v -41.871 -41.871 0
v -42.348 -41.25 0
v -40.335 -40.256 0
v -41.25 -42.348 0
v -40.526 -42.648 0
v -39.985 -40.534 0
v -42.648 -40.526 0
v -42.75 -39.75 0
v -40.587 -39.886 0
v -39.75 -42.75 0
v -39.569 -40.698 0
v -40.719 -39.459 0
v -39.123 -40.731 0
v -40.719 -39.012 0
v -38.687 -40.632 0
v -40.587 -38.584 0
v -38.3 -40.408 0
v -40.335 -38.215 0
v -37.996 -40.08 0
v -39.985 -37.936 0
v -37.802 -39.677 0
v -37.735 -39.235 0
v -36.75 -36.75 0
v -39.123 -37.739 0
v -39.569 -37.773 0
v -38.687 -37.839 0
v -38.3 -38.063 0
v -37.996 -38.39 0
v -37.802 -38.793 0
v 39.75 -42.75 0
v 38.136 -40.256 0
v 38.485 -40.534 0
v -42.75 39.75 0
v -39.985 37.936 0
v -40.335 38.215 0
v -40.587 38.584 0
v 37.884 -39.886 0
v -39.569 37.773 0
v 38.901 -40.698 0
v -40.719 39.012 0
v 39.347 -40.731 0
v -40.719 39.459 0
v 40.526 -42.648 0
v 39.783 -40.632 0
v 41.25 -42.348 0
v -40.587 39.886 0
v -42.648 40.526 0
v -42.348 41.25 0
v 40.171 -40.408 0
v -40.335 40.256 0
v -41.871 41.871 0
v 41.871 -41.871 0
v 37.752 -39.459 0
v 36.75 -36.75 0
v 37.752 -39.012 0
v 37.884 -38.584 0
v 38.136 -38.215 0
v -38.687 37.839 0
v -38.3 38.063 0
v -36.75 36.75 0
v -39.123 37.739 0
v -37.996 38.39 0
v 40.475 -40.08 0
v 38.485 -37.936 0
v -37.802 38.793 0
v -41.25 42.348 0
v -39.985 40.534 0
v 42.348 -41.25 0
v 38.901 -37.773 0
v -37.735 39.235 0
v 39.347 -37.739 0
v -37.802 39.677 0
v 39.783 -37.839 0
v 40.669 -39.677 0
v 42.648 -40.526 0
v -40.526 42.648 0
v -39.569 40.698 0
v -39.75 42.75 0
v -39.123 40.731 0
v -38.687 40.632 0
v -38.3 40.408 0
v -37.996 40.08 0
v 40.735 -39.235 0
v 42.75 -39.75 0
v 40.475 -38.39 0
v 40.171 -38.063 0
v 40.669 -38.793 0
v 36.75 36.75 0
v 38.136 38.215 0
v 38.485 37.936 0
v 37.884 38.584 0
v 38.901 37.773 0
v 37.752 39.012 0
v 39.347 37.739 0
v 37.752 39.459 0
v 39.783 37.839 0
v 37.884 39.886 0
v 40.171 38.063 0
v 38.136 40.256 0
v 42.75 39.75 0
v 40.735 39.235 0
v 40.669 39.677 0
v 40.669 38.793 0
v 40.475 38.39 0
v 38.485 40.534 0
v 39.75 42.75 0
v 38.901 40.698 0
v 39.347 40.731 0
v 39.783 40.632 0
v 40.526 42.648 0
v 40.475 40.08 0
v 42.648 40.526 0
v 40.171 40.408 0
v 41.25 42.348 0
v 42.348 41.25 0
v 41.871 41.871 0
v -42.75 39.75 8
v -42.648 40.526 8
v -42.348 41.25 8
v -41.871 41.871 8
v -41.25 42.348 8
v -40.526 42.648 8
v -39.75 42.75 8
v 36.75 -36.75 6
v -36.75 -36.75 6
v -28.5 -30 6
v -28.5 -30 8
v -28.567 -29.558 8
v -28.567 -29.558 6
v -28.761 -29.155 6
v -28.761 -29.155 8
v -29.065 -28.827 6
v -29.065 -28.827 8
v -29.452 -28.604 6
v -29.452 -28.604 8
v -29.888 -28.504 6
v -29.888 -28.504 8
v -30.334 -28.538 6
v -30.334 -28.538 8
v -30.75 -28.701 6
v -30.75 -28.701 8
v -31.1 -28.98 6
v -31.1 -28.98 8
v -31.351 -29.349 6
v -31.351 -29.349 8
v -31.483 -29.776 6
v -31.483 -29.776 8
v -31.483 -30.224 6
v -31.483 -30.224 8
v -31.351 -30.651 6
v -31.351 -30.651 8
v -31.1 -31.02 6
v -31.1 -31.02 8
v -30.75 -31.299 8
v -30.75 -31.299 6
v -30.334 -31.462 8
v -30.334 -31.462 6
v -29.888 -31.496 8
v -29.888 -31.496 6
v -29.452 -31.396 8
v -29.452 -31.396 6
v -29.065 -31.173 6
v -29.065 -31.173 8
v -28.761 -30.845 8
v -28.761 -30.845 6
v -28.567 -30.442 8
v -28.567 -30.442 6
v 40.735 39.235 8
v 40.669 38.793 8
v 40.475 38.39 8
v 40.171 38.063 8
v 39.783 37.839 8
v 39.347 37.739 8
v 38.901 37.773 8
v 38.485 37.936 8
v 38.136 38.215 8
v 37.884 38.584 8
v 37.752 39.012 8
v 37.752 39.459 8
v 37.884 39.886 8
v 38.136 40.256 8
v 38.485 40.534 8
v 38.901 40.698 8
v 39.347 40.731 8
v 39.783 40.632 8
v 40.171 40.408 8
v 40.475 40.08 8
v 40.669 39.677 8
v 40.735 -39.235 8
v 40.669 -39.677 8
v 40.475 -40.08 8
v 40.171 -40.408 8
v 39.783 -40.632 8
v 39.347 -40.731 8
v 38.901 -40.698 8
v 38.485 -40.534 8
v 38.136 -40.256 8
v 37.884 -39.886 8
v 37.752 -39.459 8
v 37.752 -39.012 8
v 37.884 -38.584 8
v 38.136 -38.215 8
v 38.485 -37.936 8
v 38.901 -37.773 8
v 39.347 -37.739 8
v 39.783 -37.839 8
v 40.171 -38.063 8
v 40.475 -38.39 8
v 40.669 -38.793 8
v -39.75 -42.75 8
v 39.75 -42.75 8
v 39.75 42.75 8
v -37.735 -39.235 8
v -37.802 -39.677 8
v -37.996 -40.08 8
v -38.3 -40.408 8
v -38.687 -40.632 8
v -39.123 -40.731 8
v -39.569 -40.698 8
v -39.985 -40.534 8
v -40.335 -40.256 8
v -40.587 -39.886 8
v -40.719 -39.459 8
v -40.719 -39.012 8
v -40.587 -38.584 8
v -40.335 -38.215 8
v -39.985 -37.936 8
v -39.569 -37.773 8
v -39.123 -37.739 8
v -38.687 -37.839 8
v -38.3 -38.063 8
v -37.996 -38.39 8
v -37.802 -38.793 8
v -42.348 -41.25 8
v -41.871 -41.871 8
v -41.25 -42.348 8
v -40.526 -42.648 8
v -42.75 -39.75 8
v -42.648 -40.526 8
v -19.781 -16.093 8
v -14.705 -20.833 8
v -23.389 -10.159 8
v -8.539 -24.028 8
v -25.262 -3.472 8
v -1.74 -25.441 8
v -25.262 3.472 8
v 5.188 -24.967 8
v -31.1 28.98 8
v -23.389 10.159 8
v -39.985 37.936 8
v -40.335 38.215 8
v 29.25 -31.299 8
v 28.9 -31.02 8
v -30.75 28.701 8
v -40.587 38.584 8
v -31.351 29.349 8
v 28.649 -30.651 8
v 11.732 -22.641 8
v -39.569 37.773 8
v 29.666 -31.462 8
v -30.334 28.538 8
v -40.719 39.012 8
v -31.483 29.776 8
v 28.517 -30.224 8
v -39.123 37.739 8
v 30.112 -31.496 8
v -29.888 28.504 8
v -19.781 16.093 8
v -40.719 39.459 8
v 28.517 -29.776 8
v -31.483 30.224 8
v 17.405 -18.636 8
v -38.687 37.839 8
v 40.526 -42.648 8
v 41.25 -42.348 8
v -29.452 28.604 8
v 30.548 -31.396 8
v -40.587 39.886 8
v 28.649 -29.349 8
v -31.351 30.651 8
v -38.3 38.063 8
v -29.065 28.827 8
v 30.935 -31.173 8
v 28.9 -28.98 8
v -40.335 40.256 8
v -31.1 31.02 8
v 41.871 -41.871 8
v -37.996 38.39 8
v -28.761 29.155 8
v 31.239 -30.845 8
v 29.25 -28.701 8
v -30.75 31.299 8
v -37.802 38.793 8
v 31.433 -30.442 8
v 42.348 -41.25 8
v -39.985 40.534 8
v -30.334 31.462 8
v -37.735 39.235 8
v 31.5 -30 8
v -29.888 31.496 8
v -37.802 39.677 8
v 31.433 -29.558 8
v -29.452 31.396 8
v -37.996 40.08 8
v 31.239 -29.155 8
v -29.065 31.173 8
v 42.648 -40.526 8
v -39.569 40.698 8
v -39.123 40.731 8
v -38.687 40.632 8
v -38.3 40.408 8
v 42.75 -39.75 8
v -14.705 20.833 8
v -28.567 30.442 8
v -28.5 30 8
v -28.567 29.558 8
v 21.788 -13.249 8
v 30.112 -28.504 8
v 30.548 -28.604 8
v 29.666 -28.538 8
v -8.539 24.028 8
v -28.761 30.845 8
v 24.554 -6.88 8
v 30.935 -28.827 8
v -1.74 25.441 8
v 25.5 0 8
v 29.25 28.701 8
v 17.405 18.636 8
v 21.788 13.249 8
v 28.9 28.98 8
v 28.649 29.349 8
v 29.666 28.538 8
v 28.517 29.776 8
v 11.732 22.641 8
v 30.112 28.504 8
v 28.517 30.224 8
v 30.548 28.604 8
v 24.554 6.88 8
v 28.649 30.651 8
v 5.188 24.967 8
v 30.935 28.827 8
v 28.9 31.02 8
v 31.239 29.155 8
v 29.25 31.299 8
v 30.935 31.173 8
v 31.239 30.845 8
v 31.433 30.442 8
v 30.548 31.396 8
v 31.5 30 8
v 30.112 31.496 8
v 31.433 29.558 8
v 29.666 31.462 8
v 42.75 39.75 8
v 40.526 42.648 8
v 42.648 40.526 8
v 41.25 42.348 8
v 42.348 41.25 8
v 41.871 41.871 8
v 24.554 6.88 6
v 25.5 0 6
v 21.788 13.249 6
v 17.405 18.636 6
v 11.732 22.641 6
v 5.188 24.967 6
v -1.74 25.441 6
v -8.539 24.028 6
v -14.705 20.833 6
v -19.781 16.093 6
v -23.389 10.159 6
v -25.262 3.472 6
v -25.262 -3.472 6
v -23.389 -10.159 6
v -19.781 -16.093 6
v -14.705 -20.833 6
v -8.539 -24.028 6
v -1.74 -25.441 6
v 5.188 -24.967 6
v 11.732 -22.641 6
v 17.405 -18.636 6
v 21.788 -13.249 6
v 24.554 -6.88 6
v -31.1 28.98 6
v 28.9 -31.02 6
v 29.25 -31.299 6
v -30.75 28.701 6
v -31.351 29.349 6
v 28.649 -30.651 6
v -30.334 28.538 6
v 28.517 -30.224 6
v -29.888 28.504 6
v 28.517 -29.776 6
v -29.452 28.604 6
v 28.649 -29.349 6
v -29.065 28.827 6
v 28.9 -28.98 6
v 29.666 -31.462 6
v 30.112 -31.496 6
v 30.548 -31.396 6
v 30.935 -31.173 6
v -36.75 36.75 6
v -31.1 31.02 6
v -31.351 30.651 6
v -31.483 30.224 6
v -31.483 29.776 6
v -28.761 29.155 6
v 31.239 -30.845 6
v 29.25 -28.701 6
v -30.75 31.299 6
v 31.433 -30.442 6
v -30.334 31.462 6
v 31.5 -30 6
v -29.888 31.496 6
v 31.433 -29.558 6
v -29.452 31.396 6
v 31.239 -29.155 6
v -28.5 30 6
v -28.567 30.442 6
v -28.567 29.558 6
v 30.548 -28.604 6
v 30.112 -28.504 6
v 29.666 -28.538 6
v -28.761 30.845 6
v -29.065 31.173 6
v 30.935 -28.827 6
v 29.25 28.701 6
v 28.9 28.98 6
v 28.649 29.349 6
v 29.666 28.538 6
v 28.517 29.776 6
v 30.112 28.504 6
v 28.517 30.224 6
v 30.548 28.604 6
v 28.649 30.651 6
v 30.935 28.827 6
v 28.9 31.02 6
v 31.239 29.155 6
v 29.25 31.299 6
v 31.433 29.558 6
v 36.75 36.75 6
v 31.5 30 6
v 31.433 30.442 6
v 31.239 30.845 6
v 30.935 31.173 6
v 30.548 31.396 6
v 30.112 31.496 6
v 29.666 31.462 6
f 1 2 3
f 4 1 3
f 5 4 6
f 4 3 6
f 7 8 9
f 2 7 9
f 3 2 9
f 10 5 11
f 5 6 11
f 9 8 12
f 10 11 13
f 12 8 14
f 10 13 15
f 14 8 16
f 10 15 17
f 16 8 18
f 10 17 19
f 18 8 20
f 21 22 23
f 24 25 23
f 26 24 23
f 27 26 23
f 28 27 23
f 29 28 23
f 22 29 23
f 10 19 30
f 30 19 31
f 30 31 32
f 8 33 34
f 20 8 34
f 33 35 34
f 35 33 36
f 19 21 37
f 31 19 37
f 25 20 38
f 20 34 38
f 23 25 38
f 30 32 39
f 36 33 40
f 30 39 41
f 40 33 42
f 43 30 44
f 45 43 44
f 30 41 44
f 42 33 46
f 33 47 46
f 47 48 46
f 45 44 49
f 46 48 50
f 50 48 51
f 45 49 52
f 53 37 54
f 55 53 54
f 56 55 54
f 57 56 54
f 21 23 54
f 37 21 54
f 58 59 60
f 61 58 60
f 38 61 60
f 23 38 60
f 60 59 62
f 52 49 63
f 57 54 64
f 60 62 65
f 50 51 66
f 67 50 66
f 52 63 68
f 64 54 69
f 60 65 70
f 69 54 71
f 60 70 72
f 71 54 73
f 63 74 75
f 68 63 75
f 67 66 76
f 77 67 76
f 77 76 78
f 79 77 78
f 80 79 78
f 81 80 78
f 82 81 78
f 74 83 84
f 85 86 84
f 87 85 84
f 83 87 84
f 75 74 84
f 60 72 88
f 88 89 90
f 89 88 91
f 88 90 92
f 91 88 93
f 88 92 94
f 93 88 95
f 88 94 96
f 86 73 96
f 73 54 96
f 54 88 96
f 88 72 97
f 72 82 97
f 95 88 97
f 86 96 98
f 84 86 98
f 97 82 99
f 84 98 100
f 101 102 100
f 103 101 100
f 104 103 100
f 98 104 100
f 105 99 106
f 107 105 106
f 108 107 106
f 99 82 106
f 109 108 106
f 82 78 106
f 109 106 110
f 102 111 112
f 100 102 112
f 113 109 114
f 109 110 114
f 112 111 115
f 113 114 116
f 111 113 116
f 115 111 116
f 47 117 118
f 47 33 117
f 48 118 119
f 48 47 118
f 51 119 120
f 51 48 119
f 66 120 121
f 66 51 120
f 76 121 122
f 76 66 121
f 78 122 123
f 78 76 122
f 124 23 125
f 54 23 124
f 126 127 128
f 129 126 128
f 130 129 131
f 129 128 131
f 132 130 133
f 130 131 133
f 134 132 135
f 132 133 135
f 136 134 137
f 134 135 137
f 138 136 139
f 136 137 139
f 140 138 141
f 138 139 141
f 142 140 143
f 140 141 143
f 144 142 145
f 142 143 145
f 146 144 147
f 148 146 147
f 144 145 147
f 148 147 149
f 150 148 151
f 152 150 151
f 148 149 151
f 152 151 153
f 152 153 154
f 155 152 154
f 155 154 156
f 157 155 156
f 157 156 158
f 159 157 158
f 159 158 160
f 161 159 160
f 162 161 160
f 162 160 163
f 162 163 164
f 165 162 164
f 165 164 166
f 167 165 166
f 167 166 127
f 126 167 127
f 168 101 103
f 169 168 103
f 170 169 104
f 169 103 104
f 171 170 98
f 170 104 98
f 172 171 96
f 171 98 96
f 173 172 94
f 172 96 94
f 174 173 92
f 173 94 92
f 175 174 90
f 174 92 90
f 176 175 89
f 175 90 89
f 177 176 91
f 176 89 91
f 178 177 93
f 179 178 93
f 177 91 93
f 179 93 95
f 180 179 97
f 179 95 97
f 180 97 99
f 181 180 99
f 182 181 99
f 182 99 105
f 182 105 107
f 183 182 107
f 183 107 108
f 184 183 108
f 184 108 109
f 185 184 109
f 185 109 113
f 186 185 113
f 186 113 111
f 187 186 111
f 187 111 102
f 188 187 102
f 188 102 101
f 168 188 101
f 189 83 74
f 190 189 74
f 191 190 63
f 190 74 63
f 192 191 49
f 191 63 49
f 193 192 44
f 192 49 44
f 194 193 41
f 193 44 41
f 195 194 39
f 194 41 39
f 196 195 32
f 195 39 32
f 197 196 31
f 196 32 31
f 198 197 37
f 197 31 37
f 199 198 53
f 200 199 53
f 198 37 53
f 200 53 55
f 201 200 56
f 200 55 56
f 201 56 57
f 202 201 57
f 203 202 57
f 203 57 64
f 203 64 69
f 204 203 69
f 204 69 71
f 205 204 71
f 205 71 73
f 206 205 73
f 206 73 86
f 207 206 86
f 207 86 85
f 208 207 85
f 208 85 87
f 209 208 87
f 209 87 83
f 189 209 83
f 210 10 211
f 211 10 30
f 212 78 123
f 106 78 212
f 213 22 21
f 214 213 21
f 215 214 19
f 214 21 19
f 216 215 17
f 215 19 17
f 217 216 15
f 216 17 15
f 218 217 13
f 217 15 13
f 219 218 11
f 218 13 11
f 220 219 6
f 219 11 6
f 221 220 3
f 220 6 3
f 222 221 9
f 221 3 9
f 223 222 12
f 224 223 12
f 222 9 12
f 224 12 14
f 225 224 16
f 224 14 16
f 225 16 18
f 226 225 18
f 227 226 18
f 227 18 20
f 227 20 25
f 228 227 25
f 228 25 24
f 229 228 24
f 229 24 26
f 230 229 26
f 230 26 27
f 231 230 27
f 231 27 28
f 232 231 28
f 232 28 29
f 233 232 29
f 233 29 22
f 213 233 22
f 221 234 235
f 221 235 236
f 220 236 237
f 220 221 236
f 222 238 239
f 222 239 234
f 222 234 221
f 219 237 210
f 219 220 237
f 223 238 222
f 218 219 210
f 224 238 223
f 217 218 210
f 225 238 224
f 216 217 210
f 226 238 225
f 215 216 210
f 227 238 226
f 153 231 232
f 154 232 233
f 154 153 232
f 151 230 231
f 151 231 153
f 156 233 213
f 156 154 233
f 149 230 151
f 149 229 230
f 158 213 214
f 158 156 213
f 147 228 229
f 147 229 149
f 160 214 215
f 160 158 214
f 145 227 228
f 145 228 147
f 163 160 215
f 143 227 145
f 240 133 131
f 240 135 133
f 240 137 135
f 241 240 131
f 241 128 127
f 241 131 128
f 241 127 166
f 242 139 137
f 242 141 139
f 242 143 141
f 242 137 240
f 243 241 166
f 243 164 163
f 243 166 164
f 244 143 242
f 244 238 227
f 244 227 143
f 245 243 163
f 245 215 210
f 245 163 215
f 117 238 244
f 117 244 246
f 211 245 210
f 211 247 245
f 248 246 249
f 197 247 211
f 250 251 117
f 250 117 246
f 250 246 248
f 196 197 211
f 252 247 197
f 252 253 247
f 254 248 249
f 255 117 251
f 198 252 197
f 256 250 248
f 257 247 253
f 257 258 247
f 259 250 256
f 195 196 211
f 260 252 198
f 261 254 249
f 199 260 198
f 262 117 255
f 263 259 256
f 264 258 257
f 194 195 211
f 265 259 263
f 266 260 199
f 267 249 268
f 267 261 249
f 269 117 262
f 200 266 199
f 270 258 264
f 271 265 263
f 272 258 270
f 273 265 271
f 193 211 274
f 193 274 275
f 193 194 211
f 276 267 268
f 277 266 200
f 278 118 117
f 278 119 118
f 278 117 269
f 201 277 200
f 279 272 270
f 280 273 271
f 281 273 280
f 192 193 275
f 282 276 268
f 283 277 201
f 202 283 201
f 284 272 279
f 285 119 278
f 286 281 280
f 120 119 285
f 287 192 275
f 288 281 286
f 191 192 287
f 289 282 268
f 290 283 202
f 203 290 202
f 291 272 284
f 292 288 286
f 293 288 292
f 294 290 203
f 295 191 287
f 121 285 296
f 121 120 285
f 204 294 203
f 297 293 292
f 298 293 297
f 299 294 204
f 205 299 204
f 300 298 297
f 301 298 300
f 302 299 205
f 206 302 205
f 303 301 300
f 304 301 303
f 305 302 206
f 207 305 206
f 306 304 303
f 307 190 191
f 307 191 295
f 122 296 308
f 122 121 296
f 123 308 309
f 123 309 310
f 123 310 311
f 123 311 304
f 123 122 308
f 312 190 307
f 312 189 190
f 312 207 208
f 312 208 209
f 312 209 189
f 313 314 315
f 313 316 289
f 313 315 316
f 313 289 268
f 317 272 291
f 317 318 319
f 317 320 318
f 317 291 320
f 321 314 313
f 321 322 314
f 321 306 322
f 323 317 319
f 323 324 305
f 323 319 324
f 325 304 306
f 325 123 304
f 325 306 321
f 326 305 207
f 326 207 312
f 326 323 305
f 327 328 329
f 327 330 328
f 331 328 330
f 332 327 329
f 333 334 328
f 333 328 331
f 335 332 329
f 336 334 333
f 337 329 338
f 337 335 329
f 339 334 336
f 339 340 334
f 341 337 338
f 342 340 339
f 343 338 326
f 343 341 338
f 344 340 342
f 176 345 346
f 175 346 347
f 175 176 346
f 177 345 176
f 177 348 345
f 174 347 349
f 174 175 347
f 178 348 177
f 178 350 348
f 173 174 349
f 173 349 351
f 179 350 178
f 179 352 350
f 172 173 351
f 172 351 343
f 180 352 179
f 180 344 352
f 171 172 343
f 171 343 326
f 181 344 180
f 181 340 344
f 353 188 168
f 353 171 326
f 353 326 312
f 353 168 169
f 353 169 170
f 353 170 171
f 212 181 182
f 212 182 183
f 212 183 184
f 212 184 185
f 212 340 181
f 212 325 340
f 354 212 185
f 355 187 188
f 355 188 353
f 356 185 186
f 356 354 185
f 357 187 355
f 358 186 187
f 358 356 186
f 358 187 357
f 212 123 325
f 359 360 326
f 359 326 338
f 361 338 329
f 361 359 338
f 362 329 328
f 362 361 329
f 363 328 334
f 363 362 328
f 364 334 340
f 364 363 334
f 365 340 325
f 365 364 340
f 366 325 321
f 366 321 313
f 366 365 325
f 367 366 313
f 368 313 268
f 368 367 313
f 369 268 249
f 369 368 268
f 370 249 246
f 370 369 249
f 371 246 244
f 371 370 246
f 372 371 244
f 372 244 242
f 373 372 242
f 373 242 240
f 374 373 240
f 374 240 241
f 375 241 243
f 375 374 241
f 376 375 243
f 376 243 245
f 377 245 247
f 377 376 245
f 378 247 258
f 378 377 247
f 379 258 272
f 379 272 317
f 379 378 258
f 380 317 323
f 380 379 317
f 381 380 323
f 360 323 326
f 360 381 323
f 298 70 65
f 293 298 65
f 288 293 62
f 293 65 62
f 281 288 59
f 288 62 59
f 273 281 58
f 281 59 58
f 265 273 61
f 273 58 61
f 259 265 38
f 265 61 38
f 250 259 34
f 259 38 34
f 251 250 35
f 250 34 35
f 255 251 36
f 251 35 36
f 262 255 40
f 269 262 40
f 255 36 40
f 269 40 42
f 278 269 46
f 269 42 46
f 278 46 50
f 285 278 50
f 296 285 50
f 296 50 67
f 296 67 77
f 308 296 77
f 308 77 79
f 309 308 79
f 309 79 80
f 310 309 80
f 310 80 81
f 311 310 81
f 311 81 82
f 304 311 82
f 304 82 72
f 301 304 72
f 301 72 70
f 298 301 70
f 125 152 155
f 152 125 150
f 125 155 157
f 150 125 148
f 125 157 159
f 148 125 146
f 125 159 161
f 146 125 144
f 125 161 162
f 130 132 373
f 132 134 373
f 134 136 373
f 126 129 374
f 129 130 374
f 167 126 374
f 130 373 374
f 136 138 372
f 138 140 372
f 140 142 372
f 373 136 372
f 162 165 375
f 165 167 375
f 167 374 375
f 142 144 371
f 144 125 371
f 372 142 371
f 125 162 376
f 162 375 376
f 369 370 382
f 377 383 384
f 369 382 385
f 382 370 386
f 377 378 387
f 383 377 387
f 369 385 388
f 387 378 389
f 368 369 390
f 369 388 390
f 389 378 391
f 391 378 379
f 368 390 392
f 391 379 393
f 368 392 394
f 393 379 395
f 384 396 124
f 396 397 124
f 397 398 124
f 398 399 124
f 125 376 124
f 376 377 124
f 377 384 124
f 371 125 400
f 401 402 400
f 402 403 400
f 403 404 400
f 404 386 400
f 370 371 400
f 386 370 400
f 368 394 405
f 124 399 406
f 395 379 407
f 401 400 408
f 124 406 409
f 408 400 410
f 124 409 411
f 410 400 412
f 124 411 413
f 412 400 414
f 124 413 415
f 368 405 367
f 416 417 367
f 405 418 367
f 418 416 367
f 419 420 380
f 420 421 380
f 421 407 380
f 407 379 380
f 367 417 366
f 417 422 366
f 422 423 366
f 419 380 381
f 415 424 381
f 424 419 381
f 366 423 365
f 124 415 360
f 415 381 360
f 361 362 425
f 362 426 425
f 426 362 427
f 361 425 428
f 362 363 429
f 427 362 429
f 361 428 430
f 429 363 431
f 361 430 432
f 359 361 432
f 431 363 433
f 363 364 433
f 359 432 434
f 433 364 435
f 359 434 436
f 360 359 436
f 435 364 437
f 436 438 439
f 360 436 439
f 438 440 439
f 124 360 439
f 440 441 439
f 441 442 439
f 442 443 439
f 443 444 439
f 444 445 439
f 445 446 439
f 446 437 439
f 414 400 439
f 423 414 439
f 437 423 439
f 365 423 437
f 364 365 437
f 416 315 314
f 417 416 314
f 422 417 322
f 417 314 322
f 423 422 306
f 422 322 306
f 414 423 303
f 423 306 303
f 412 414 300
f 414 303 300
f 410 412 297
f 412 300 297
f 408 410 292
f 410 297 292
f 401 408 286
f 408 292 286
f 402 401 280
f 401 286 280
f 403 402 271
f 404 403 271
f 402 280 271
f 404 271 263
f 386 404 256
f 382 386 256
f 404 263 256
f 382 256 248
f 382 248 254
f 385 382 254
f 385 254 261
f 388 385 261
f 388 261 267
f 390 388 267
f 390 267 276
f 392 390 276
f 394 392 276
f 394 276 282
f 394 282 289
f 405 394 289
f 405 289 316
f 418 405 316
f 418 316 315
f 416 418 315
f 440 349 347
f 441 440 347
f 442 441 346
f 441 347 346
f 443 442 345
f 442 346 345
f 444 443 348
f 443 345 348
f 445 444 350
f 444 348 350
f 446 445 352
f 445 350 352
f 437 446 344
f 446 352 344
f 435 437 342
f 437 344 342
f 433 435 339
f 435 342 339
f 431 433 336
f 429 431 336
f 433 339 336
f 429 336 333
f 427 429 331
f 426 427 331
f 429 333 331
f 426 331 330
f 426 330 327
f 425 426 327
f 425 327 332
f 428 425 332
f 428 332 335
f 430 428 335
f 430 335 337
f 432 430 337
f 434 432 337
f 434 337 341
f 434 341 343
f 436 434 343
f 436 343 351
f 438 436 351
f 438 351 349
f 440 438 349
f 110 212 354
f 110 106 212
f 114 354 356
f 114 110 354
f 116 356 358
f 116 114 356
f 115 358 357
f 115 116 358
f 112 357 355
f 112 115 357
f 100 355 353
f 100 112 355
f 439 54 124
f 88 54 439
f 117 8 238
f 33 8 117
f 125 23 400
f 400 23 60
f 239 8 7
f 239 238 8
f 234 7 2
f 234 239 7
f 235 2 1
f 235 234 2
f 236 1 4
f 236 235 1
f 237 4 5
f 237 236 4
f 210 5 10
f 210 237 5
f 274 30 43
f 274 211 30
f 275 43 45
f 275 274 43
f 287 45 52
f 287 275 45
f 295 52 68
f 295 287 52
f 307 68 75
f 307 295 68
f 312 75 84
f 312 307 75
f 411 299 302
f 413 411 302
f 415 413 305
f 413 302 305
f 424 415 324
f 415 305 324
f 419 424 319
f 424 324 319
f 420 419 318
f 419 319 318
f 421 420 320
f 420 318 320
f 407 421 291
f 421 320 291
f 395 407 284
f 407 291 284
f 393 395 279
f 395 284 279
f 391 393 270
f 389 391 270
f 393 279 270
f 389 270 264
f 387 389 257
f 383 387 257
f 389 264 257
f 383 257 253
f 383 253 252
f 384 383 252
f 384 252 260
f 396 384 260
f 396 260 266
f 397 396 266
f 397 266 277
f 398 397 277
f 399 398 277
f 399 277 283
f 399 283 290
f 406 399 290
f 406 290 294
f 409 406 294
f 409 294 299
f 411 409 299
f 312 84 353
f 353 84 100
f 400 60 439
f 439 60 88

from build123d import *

# Parameters (mm, degrees)
SKETCH006_W     = 85.5
SKETCH006_H     = 85.5
SKETCH006_W_2   = 73.5
SKETCH006_H_2   = 73.5
PAD003_DEPTH    = 6
SKETCH007_W     = 85.5
SKETCH007_H     = 85.5
SKETCH007_R     = 25.5
PAD004_DEPTH    = 2
SKETCH008_R     = 1.5
POCKET_DEPTH    = 8.001
SKETCH009_R     = 1.5
POCKET001_DEPTH = 5
FILLET002_R     = 3


with BuildPart() as part:
    # Sketch006 → Pad003 (new body)
    with BuildSketch(Plane.XY):
        Rectangle(SKETCH006_W, SKETCH006_H)
        Rectangle(SKETCH006_W_2, SKETCH006_H_2, mode=Mode.SUBTRACT)
    extrude(amount=PAD003_DEPTH)

    # Sketch007 (on Face10 of Pad003) → Pad004 (join)
    with BuildSketch(Plane.XY.offset(6)):
        Rectangle(SKETCH007_W, SKETCH007_H)
        Circle(SKETCH007_R, mode=Mode.SUBTRACT)
    extrude(amount=PAD004_DEPTH)

    # Sketch008 (on Face4 of Pad004) → Pocket (cut, through all)
    with BuildSketch(Plane(origin=(0, 0, 0), x_dir=(1, 0, 0), z_dir=(0, 0, -1))):
        with Locations((-39.235281, 39.235281)):
            Circle(SKETCH008_R)
        with Locations((39.235281, 39.235281)):
            Circle(SKETCH008_R)
        with Locations((39.235281, -39.235281)):
            Circle(SKETCH008_R)
        with Locations((-39.235281, -39.235281)):
            Circle(SKETCH008_R)
    extrude(amount=-POCKET_DEPTH, mode=Mode.SUBTRACT)

    # Sketch009 (on Face17 of Pocket) → Pocket001 (cut)
    with BuildSketch(Plane.XY.offset(8)):
        with Locations((-30, 30)):
            Circle(SKETCH009_R)
        with Locations((30, 30)):
            Circle(SKETCH009_R)
        with Locations((30, -30)):
            Circle(SKETCH009_R)
        with Locations((-30, -30)):
            Circle(SKETCH009_R)
    extrude(amount=-POCKET001_DEPTH, mode=Mode.SUBTRACT)

    # Fillet002
    fillet002_edges = [part.edges().sort_by_distance(p)[0] for p in [
        (42.75, 42.75, 3),
        (-42.75, 42.75, 3),
        (-42.75, -42.75, 3),
        (42.75, -42.75, 3),
    ]]
    fillet(fillet002_edges, radius=FILLET002_R)


solid = part.part
